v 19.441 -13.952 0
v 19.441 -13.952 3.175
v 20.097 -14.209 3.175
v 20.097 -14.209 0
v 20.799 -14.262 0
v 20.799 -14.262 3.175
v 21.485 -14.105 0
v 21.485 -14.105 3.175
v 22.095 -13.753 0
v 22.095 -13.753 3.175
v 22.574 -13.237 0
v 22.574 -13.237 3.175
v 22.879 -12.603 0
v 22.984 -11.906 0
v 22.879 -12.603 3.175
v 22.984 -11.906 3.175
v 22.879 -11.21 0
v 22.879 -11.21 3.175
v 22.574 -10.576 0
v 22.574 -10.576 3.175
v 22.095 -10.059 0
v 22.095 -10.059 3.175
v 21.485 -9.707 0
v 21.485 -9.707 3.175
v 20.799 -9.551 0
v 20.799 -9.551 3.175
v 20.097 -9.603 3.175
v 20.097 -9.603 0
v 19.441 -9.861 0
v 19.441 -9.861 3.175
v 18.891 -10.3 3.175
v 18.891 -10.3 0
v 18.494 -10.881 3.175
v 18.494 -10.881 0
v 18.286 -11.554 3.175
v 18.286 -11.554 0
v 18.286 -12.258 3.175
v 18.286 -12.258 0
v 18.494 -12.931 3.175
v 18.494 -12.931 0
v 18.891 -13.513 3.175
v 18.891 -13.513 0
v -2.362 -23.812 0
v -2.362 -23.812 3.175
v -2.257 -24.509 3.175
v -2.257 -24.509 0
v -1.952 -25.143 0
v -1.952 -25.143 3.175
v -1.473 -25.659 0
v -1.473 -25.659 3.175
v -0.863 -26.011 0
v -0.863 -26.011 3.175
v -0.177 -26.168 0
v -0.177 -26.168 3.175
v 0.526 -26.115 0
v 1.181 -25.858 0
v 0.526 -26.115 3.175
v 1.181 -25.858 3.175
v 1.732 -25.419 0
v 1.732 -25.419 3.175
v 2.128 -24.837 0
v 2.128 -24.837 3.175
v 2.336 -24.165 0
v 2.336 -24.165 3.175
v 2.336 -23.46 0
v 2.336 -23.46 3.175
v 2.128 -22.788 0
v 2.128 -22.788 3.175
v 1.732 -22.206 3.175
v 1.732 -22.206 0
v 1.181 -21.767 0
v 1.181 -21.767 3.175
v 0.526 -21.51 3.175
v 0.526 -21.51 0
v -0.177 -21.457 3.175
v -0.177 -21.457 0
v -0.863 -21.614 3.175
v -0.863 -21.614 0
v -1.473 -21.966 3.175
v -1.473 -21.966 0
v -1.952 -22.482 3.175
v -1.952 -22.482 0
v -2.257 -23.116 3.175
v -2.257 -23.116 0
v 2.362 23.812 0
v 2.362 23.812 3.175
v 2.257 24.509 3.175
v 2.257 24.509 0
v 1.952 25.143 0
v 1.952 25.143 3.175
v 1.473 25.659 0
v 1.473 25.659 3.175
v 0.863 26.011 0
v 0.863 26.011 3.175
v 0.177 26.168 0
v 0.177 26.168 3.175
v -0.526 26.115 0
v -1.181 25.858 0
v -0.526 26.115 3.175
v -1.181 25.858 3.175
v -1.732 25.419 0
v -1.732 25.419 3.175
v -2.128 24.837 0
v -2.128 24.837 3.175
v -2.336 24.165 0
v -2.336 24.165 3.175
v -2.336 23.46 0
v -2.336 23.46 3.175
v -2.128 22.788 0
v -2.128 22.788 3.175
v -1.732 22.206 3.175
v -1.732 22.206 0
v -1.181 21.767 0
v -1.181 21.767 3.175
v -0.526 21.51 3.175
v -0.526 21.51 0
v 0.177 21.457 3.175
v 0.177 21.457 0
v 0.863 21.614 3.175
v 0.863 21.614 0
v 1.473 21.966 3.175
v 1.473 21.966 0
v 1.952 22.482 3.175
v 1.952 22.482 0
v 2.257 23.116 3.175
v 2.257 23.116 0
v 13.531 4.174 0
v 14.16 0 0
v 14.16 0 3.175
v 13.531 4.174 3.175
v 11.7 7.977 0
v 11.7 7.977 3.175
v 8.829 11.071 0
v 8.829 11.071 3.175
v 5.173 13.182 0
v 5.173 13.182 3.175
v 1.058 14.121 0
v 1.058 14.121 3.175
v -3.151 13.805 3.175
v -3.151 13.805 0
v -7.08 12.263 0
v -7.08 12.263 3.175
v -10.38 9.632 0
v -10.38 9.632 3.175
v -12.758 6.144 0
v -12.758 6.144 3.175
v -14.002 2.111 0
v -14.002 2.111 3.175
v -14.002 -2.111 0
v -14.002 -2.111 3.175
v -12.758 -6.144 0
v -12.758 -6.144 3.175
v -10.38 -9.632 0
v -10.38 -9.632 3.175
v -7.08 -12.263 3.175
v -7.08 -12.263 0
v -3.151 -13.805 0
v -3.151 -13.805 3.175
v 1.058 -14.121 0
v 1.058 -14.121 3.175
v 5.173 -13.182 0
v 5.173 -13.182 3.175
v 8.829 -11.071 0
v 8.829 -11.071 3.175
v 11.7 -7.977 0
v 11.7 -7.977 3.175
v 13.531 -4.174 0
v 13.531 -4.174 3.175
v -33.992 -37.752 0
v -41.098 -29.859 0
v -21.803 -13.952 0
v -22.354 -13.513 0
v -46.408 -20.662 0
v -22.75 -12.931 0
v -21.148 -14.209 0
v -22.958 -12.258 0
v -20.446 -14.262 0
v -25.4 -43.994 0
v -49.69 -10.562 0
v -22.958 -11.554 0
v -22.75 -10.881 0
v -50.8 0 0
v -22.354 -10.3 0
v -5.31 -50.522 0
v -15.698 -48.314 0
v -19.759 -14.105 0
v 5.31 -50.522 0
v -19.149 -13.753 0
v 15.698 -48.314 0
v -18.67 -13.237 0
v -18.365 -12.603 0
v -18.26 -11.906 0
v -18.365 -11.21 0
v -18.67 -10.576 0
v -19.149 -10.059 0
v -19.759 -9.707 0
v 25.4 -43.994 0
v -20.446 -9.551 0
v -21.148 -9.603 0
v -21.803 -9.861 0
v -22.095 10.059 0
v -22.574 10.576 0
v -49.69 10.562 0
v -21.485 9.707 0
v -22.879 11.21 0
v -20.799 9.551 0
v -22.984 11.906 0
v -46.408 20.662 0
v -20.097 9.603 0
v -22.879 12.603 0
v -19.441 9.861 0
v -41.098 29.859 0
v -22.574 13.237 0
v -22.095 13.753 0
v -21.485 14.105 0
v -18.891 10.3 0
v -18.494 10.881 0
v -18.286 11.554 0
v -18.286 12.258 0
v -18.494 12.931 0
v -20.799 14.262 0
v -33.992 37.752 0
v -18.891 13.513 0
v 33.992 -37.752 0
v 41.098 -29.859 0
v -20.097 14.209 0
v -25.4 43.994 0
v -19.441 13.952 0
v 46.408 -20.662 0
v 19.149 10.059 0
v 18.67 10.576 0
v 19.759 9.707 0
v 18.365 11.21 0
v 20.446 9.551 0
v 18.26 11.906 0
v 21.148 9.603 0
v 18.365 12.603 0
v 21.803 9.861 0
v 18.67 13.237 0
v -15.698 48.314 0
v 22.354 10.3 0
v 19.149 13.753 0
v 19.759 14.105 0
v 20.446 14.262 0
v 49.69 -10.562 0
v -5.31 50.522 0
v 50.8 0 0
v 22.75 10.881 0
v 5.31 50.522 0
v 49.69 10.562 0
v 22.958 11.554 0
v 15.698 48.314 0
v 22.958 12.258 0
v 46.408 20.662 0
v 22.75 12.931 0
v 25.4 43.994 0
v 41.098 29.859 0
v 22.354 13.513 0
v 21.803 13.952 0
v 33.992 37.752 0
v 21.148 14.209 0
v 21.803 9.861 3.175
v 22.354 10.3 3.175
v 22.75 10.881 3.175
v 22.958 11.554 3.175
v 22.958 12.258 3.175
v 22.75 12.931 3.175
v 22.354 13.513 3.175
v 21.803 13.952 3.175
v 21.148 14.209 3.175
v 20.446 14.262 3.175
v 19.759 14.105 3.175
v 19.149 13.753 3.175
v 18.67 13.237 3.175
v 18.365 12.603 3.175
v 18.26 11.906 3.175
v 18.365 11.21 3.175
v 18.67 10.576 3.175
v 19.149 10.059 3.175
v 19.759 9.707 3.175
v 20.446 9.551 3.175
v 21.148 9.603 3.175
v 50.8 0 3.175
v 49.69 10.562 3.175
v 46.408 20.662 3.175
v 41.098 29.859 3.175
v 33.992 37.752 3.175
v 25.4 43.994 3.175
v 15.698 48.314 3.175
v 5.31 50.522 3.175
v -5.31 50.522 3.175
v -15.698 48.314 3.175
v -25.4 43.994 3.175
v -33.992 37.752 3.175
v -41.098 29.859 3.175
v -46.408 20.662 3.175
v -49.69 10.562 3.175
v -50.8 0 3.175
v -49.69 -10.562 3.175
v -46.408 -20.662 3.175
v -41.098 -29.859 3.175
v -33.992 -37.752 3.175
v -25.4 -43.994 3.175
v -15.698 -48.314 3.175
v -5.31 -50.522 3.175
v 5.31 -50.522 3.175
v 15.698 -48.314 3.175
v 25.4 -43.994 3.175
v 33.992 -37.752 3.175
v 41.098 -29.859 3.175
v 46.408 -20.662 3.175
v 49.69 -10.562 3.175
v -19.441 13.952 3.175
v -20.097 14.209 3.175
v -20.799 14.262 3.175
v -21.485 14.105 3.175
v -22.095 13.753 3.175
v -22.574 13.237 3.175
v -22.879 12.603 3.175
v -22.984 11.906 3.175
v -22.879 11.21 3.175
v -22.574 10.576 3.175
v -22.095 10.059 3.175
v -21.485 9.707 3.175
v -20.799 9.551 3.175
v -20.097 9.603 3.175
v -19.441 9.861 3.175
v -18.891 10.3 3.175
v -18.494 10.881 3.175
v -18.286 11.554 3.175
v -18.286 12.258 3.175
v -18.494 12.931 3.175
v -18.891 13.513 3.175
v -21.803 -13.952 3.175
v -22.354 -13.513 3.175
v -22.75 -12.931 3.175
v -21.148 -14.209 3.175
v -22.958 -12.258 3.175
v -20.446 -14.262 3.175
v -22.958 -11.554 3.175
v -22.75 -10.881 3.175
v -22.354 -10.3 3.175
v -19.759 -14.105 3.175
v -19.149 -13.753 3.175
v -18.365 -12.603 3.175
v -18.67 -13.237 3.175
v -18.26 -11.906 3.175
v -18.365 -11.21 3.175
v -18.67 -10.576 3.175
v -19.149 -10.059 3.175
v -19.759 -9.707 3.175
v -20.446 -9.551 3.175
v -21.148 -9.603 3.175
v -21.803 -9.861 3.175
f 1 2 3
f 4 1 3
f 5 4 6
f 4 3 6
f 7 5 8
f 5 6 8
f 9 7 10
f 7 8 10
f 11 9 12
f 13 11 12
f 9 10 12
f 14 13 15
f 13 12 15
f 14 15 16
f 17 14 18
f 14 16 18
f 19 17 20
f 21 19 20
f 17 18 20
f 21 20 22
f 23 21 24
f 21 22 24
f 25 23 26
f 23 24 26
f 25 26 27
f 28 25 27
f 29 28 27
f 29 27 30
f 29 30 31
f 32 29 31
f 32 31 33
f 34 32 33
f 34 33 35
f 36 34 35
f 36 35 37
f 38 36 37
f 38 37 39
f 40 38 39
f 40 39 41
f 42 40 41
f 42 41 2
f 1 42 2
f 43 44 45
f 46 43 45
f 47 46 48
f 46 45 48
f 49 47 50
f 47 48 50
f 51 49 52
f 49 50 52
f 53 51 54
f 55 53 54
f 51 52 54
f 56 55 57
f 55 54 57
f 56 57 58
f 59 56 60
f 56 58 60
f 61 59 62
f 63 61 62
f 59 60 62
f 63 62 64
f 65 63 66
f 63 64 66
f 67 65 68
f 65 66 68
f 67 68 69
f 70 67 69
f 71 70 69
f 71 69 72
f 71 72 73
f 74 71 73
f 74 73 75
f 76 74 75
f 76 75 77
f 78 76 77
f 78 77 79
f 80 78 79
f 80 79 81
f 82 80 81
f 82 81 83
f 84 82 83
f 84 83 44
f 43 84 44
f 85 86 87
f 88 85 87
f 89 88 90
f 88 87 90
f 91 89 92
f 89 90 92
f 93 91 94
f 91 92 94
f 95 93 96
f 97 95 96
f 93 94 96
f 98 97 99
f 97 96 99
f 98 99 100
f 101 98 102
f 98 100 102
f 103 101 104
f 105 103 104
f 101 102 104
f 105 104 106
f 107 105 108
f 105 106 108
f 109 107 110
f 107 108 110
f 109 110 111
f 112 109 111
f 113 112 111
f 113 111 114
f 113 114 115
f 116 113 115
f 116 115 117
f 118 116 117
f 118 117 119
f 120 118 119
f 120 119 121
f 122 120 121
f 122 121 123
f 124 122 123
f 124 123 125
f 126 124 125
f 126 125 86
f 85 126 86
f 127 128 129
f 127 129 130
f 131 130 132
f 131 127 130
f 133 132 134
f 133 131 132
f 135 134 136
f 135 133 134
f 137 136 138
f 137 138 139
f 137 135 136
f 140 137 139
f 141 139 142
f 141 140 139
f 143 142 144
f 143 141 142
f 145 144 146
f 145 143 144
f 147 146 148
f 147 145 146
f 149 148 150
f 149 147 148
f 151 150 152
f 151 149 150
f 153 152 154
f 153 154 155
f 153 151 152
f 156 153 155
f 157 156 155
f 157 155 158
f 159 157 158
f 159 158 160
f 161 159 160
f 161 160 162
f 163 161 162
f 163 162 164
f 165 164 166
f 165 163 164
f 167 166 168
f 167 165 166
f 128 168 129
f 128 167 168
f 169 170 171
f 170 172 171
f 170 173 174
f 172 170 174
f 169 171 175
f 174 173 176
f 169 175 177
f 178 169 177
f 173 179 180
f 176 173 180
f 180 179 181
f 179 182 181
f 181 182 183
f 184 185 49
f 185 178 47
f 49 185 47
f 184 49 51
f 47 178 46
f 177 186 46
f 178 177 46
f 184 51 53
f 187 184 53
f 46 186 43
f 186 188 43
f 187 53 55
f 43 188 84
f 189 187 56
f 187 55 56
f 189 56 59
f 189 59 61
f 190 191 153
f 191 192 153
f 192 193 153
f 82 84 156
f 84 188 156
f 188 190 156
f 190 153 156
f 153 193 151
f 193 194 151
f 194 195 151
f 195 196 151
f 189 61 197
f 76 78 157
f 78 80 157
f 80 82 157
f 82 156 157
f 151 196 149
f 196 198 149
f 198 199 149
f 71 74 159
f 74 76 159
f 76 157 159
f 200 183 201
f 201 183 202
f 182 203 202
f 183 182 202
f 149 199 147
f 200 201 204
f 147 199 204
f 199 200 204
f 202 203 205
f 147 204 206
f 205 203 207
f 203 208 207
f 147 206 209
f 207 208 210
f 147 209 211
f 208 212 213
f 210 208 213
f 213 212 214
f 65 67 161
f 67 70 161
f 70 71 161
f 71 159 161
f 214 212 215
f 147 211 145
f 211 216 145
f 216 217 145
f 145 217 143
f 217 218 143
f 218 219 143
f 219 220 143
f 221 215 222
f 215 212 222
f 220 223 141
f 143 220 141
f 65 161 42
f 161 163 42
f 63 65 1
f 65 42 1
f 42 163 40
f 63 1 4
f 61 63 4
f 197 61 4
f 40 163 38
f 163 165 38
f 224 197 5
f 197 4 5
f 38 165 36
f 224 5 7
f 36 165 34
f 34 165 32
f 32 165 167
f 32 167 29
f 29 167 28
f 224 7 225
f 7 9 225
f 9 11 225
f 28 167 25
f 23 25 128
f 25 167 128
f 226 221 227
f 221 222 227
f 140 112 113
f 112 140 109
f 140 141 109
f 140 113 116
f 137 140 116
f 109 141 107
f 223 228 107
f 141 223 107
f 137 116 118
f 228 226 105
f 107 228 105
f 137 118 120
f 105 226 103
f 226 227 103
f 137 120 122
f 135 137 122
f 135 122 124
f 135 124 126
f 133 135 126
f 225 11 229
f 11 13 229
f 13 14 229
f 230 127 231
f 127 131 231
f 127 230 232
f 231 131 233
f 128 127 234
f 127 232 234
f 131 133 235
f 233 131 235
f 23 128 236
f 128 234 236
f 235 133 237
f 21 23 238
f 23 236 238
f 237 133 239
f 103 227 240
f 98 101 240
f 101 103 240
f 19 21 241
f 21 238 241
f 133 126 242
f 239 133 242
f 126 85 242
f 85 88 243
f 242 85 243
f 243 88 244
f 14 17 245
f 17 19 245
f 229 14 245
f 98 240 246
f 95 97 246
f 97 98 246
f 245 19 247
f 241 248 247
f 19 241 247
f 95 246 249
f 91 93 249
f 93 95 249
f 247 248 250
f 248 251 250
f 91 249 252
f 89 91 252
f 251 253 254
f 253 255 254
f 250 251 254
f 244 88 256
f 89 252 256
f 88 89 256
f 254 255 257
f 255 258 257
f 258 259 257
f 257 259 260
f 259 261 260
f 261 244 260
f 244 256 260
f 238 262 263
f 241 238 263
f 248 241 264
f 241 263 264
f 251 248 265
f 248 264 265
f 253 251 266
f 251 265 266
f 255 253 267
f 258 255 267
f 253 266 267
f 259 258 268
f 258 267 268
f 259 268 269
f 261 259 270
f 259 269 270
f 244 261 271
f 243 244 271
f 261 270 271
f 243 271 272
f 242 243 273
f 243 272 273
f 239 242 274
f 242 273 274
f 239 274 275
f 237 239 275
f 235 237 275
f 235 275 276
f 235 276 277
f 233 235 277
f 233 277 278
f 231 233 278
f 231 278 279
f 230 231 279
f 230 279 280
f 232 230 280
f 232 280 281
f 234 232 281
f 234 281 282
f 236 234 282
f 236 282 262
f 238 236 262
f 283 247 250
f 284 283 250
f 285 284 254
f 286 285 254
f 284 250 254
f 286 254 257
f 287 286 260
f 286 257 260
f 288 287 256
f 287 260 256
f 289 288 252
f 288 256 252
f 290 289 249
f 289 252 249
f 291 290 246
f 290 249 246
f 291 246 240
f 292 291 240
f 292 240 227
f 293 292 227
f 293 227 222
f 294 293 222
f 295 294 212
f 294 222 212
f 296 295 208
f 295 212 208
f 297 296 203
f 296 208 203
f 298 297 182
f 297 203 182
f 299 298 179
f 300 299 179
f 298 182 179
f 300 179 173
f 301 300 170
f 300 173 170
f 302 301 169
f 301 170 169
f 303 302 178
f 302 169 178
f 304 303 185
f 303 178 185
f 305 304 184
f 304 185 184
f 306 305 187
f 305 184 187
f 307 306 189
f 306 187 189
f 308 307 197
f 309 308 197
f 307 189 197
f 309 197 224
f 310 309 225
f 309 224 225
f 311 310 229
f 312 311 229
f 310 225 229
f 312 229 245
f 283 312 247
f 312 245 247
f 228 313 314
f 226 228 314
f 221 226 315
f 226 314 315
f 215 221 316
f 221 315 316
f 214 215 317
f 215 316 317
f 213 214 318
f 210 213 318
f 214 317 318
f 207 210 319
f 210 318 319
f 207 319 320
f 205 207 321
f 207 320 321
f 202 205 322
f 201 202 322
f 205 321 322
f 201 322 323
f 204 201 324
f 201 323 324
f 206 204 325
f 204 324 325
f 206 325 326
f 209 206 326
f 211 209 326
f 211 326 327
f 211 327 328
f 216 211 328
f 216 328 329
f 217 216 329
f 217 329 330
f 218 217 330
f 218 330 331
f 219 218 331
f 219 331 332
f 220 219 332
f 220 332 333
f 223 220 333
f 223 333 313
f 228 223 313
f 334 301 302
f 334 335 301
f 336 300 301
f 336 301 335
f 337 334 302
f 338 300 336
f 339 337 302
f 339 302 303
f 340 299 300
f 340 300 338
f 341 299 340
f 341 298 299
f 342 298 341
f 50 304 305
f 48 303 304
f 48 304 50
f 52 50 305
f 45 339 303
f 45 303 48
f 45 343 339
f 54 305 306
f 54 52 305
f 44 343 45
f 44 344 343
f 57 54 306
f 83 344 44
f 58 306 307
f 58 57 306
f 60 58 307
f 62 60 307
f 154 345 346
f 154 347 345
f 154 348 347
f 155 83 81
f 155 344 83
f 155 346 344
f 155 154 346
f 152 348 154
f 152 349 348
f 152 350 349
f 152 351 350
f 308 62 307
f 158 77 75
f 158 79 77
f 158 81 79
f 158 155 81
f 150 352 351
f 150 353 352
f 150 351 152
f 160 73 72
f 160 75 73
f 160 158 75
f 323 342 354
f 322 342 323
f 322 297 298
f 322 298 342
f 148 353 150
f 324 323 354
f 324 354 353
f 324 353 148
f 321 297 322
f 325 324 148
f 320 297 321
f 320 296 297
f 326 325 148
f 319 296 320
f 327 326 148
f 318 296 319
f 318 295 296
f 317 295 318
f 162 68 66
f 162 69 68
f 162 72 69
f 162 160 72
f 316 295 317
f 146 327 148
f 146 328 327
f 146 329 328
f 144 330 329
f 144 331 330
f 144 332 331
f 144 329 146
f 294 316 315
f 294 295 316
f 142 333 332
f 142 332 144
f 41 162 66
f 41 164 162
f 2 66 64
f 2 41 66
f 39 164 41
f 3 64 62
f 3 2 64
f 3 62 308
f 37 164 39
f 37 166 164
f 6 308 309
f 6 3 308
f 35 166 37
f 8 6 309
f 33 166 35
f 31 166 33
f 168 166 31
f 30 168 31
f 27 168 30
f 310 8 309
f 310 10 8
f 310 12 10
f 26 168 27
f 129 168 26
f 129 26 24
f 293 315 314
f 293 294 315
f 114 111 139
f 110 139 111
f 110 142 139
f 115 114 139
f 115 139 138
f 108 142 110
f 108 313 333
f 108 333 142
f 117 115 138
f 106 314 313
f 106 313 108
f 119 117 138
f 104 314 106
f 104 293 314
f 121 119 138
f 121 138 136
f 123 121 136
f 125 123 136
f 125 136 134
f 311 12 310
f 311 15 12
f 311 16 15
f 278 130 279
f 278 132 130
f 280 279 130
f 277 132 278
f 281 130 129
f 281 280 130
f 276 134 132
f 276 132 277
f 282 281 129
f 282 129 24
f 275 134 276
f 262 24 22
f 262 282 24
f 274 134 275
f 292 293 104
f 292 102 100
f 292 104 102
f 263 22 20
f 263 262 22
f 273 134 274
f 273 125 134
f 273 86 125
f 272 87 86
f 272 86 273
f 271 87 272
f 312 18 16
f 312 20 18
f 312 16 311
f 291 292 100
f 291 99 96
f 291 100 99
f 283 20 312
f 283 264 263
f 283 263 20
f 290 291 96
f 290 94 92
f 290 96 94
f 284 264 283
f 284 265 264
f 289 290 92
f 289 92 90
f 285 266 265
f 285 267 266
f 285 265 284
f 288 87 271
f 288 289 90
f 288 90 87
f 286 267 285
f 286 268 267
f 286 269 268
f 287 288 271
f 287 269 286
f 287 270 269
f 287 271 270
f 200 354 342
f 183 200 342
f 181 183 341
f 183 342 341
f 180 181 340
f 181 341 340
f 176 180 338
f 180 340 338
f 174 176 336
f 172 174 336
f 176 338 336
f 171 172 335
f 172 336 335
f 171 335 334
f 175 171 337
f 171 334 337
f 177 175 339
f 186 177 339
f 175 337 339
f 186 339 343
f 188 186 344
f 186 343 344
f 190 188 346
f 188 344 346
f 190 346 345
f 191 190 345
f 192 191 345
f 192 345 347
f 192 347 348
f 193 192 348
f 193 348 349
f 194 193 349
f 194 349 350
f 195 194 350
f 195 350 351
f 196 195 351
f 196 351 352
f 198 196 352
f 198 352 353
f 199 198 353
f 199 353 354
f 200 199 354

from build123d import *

# Parameters (mm, degrees)
F0_R            = 50.8
F0_R_2          = 14.1605
F1_DEPTH        = 3.175
F2_R            = 2.3622
F3_DEPTH        = 3.176
F3_COPIES_COUNT = 6


# Not quite as in the source:
# - a pattern or mirror of a feature is missing from the dataset's text; its kind, count and spacing are read off the source's solid


with BuildPart() as f1:
    # F0 (on Top) → F1 (new body)
    with BuildSketch(Plane.XY):
        Circle(F0_R)
        Circle(F0_R_2, mode=Mode.SUBTRACT)
    extrude(amount=F1_DEPTH)

    # F2 (on face) → F3 (cut, through all)
    with BuildSketch(Plane.XY.offset(3.175)):
        with Locations((0, 23.8125)):
            Circle(F2_R)
    f3 = extrude(amount=-F3_DEPTH, mode=Mode.SUBTRACT)

    # F3_copies: F3 ×6 about axis
    f3_copies_axis = Axis((0, 0, 0), (0, 0, 1))
    for i in range(1, F3_COPIES_COUNT):
        add(f3.rotate(f3_copies_axis, i * 360 / F3_COPIES_COUNT), mode=Mode.SUBTRACT)


solid = f1.part
